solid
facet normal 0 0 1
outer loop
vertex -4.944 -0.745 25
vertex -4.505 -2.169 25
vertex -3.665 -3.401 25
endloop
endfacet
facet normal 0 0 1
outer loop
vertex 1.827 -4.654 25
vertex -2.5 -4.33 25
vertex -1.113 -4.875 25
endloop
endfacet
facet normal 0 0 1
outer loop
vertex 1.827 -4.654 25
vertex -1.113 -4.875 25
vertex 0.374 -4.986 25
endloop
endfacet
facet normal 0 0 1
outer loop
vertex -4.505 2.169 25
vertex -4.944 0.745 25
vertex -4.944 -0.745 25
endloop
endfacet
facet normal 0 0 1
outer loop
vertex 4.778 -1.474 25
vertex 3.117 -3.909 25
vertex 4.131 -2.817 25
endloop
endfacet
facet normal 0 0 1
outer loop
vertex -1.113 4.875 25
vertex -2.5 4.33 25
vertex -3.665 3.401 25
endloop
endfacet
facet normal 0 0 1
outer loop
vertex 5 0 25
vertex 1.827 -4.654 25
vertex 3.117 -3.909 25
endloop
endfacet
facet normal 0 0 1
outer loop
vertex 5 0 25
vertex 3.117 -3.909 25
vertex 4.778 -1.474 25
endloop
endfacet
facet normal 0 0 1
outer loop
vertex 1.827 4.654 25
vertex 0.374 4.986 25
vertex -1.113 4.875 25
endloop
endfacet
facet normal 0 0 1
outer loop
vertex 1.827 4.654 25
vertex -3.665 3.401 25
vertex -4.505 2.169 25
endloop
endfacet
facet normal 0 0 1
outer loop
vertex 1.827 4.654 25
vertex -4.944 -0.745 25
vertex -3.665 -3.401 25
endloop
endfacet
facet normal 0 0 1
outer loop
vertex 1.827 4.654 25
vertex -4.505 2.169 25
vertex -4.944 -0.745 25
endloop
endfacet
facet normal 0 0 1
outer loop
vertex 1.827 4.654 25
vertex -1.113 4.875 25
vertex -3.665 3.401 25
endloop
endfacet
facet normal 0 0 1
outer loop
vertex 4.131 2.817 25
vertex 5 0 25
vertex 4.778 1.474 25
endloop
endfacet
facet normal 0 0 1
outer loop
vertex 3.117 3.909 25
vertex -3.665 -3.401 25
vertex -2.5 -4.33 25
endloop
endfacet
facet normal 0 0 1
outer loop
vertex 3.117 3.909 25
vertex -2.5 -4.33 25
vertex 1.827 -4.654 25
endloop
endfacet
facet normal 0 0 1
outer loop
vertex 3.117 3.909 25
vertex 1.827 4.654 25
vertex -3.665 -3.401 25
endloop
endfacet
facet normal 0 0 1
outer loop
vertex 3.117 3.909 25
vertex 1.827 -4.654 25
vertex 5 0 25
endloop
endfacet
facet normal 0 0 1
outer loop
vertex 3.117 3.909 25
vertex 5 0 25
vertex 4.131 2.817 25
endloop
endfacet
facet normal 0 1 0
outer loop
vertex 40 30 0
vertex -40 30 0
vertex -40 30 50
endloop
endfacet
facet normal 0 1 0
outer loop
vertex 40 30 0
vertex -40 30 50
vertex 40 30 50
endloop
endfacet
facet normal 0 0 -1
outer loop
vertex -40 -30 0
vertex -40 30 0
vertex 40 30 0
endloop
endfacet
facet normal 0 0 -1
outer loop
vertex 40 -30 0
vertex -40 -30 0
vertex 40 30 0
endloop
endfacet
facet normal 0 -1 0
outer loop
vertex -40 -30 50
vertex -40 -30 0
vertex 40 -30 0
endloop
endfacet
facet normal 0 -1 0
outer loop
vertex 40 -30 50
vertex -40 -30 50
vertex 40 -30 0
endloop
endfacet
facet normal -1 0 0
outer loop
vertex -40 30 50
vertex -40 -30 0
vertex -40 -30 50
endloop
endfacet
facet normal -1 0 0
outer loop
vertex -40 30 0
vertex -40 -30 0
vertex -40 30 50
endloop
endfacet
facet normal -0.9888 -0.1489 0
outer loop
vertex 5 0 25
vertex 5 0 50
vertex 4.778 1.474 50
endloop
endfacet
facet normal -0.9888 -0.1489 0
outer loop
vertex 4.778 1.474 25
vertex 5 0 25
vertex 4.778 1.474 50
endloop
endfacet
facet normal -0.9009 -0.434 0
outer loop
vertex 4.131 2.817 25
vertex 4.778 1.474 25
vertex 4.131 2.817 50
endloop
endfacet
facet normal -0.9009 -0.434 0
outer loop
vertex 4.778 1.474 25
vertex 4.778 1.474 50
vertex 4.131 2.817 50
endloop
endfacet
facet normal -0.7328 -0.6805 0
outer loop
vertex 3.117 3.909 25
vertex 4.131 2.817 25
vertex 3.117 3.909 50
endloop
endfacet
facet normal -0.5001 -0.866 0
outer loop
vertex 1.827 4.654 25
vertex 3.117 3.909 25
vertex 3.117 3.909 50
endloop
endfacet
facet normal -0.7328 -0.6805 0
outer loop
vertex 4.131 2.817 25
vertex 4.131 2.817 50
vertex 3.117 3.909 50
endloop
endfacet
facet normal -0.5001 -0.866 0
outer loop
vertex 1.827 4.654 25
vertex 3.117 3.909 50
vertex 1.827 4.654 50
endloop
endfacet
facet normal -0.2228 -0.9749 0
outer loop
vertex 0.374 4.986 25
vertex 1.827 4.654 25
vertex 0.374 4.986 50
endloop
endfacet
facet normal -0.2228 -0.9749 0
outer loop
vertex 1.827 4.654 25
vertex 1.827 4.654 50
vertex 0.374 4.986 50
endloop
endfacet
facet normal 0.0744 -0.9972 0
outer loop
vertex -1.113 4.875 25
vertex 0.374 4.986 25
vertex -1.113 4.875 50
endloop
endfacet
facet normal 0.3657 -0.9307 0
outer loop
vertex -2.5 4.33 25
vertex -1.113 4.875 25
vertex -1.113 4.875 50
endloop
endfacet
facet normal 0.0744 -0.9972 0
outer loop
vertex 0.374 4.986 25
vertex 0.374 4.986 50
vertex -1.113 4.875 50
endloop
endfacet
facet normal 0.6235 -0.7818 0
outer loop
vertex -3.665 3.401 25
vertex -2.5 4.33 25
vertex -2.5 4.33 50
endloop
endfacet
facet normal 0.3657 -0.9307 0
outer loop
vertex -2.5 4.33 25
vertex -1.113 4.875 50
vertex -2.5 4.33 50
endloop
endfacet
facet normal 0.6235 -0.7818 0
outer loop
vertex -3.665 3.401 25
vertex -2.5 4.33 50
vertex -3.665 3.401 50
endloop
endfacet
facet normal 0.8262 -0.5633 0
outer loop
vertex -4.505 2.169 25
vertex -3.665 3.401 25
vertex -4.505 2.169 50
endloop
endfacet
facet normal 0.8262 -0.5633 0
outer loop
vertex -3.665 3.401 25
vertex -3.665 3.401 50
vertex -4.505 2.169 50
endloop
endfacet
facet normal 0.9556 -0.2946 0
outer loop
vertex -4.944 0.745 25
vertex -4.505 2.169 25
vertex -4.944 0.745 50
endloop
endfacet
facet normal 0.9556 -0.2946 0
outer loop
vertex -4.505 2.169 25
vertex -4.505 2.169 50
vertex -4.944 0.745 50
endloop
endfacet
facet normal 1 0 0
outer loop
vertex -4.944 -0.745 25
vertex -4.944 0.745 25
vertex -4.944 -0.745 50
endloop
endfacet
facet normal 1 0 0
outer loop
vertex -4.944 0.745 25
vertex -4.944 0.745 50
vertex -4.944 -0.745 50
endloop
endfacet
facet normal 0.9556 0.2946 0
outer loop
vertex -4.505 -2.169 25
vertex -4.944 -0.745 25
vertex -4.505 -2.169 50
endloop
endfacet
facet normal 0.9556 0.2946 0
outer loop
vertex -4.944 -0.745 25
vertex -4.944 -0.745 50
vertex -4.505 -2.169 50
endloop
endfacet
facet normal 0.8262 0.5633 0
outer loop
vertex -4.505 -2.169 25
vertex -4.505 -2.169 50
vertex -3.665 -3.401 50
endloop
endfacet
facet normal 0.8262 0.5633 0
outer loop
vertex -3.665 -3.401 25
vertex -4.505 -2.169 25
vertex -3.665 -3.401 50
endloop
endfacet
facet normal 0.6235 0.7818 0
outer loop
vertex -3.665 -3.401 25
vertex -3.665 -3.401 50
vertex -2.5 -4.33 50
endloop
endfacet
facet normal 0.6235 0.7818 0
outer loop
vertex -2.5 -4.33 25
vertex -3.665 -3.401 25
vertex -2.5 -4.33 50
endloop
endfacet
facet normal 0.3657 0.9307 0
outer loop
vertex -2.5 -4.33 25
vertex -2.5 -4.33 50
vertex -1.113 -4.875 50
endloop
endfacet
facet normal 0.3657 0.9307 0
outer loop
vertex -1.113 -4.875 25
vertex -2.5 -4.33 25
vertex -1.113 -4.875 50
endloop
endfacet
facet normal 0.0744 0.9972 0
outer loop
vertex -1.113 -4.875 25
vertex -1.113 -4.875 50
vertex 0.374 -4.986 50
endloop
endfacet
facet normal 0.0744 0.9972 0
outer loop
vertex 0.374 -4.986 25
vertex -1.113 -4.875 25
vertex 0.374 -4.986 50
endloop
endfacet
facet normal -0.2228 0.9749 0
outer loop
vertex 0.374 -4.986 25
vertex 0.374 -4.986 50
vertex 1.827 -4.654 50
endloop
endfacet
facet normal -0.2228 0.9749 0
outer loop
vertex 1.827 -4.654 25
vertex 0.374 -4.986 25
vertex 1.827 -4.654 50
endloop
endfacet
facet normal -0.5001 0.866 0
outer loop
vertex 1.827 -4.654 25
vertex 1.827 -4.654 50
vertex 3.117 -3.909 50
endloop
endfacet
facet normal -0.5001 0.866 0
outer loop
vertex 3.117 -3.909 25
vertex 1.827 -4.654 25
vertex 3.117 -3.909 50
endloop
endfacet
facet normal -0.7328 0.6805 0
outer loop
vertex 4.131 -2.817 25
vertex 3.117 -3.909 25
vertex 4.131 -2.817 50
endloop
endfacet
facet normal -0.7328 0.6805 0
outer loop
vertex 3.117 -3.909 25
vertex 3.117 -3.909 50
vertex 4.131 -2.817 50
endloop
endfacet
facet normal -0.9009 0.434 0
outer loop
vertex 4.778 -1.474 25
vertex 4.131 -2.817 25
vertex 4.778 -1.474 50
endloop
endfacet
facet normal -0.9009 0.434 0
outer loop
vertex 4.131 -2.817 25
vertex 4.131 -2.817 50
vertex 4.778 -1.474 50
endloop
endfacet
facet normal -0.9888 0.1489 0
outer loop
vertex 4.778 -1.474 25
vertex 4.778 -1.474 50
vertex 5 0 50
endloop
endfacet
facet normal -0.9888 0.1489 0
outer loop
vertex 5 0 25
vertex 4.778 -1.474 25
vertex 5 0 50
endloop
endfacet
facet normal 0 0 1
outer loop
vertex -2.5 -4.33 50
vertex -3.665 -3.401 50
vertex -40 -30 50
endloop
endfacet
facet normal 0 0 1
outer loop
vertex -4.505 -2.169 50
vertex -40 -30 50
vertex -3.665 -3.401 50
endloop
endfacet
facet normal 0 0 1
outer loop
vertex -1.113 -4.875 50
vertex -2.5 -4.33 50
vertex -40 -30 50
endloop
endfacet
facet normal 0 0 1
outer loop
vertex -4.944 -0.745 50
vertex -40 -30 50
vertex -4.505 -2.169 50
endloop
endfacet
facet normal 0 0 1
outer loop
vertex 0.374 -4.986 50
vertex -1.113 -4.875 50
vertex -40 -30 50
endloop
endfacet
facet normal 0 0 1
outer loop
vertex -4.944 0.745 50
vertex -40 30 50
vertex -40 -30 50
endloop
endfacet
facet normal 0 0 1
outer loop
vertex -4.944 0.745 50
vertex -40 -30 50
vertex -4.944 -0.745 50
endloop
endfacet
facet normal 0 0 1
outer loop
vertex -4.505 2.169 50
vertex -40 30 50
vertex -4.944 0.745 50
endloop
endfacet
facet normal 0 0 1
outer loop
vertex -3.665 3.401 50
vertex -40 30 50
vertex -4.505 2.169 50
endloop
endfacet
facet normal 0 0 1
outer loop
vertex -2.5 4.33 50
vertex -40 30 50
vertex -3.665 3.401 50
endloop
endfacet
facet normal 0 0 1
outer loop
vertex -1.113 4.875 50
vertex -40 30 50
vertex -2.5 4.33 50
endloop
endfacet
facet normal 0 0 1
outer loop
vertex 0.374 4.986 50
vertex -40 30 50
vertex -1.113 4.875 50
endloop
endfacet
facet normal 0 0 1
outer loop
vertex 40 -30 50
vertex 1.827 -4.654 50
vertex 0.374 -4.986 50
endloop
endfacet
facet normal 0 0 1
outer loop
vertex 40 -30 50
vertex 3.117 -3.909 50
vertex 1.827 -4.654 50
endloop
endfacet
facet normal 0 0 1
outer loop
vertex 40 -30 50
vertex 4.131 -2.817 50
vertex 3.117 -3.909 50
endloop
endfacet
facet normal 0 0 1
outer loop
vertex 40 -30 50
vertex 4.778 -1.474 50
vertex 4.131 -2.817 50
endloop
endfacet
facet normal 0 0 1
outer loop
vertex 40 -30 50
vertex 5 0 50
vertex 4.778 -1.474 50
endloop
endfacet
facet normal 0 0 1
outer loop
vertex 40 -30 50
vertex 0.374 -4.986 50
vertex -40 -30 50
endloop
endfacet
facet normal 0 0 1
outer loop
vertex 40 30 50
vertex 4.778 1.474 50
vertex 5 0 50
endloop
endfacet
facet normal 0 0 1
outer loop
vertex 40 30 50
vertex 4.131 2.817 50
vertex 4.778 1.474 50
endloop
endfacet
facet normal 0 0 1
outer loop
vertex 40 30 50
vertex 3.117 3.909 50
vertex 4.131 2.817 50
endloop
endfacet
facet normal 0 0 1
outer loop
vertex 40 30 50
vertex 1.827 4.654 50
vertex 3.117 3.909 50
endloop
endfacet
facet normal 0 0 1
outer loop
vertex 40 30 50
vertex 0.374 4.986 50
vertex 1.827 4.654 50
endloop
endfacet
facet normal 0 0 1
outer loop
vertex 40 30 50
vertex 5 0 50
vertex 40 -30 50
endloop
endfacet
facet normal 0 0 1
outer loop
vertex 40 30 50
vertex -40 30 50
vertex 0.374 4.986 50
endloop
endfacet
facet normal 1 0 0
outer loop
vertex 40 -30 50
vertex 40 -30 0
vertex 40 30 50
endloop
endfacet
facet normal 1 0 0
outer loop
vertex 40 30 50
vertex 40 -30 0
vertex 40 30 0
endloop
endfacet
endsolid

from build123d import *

# Parameters (mm, degrees)
F0_W     = 80
F0_H     = 60
F1_DEPTH = 50
F2_R     = 5
F3_DEPTH = 25


with BuildPart() as f1:
    # F0 (on Top) → F1 (new body)
    with BuildSketch(Plane.XY):
        Rectangle(F0_W, F0_H)
    extrude(amount=F1_DEPTH)

    # F2 (on face) → F3 (cut)
    with BuildSketch(Plane.XY.offset(50)):
        Circle(F2_R)
    extrude(amount=-F3_DEPTH, mode=Mode.SUBTRACT)


solid = f1.part
